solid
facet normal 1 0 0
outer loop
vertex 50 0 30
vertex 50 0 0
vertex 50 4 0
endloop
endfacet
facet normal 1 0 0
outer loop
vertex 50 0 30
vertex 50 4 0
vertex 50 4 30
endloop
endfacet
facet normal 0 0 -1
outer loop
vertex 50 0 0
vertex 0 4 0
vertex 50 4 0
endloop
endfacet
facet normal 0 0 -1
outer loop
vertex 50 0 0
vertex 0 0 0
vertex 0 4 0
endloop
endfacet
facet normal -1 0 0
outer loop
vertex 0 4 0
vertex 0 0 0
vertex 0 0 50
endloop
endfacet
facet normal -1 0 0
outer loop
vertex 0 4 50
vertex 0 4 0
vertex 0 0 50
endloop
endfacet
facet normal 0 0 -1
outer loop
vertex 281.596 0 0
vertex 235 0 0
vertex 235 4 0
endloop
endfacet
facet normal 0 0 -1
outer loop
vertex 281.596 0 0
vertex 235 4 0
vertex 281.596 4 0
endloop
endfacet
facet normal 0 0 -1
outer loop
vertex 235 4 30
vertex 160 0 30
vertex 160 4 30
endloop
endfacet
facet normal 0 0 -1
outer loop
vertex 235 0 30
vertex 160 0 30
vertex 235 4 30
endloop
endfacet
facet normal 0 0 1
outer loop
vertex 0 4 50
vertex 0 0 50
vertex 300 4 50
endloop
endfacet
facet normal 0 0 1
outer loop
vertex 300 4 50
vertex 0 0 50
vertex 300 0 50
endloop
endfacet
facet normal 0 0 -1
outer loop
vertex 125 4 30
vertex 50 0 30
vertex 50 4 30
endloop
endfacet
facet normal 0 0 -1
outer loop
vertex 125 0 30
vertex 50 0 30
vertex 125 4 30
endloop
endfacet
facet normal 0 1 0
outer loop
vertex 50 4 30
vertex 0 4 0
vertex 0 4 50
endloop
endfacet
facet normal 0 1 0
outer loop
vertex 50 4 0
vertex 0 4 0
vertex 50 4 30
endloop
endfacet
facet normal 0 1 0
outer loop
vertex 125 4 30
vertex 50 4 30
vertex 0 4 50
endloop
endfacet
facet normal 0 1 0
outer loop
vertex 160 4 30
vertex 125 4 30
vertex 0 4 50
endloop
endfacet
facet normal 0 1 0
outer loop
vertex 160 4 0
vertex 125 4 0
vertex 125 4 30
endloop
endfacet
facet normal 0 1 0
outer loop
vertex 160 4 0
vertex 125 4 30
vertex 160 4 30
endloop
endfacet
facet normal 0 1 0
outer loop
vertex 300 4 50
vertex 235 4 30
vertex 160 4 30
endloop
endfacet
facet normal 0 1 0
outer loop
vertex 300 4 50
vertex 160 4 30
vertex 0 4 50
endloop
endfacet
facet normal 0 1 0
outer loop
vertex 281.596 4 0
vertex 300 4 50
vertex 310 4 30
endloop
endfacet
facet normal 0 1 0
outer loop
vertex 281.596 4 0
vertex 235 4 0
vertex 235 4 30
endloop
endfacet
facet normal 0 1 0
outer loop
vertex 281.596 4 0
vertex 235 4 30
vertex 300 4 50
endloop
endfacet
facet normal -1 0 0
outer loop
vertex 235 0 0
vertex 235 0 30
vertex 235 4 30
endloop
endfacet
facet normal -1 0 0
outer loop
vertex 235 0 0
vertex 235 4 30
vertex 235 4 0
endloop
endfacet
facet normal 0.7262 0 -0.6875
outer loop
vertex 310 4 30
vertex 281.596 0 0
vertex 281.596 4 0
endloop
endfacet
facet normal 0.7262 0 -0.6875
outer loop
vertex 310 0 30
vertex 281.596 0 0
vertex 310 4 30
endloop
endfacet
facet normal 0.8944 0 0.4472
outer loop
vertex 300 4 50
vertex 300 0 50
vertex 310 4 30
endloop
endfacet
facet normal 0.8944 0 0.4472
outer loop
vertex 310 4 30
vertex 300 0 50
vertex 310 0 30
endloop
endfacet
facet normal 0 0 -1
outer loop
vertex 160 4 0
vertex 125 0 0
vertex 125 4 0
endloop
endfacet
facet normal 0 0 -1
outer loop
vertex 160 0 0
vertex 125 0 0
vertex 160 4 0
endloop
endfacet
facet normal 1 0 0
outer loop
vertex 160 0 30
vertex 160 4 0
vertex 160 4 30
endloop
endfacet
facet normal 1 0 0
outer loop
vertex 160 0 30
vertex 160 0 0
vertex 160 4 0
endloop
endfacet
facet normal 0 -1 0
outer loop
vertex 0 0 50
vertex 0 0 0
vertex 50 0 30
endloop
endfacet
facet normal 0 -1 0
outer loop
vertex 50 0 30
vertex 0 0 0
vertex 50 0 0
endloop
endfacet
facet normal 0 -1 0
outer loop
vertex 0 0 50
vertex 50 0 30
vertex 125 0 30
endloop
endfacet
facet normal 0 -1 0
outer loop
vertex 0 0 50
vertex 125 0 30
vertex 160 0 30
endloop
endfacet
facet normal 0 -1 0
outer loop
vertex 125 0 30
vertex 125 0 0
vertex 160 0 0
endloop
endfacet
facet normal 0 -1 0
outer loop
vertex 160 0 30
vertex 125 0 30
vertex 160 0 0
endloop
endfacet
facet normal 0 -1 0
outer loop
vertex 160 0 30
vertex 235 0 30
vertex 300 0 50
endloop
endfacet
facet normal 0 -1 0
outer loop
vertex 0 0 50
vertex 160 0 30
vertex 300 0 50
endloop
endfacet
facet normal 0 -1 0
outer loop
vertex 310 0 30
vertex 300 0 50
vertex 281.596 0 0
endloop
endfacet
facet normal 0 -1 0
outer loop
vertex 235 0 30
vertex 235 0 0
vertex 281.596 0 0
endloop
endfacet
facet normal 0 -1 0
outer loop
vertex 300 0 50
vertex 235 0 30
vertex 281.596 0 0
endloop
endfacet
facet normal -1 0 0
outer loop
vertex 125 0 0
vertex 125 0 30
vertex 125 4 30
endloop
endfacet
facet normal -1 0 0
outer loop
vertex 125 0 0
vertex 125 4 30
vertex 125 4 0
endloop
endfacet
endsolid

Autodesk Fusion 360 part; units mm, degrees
sketch "Sketch1" plane through (0, 0, 0) normal (0, 1, 0) x (1, 0, 0)
  line L0 (0, 0) -> (0, -50)
  line L1 (0, -50) -> (300, -50)
  line L2 (0, 0) -> (50, 0)
  line L3 (50, 0) -> (50, -30)
  line L4 (50, -30) -> (125, -30)
  line L5 (125, -30) -> (125, 0)
  line L6 (125, 0) -> (160, 0)
  line L7 (160, 0) -> (160, -30)
  line L8 (160, -30) -> (235, -30)
  line L9 (235, -30) -> (235, 0)
  line L10 (235, 0) -> (281.5957, 0)
  line L11 (299.4269, -50.5394) -> (300, -50)
  line L12 (0, 0) -> (350, 0) construction
  line L13 (281.5957, 0) -> (310, -30) construction
  line L14 (310, -30) -> (300, -50) construction
  line L15 (281.5957, 0) -> (310, -30)
  line L16 (300, -50) -> (310, -30)
  dimension "d1" = 50
  dimension "d2" = 300
  dimension "d3" = 50
  dimension "d4" = 30
  dimension "d5" = 75
  dimension "d6" = 35
  dimension "d7" = 75
  dimension "d11" = 30
  dimension "d12" = 30
  dimension "d13" = 350
  dimension "d16" = 30
  dimension "d17" = 30
  dimension "d19" = 110
  dimension "d20" = 41.3135
extrude "Extrude1" add sketch "Sketch1" along normal blind 4
